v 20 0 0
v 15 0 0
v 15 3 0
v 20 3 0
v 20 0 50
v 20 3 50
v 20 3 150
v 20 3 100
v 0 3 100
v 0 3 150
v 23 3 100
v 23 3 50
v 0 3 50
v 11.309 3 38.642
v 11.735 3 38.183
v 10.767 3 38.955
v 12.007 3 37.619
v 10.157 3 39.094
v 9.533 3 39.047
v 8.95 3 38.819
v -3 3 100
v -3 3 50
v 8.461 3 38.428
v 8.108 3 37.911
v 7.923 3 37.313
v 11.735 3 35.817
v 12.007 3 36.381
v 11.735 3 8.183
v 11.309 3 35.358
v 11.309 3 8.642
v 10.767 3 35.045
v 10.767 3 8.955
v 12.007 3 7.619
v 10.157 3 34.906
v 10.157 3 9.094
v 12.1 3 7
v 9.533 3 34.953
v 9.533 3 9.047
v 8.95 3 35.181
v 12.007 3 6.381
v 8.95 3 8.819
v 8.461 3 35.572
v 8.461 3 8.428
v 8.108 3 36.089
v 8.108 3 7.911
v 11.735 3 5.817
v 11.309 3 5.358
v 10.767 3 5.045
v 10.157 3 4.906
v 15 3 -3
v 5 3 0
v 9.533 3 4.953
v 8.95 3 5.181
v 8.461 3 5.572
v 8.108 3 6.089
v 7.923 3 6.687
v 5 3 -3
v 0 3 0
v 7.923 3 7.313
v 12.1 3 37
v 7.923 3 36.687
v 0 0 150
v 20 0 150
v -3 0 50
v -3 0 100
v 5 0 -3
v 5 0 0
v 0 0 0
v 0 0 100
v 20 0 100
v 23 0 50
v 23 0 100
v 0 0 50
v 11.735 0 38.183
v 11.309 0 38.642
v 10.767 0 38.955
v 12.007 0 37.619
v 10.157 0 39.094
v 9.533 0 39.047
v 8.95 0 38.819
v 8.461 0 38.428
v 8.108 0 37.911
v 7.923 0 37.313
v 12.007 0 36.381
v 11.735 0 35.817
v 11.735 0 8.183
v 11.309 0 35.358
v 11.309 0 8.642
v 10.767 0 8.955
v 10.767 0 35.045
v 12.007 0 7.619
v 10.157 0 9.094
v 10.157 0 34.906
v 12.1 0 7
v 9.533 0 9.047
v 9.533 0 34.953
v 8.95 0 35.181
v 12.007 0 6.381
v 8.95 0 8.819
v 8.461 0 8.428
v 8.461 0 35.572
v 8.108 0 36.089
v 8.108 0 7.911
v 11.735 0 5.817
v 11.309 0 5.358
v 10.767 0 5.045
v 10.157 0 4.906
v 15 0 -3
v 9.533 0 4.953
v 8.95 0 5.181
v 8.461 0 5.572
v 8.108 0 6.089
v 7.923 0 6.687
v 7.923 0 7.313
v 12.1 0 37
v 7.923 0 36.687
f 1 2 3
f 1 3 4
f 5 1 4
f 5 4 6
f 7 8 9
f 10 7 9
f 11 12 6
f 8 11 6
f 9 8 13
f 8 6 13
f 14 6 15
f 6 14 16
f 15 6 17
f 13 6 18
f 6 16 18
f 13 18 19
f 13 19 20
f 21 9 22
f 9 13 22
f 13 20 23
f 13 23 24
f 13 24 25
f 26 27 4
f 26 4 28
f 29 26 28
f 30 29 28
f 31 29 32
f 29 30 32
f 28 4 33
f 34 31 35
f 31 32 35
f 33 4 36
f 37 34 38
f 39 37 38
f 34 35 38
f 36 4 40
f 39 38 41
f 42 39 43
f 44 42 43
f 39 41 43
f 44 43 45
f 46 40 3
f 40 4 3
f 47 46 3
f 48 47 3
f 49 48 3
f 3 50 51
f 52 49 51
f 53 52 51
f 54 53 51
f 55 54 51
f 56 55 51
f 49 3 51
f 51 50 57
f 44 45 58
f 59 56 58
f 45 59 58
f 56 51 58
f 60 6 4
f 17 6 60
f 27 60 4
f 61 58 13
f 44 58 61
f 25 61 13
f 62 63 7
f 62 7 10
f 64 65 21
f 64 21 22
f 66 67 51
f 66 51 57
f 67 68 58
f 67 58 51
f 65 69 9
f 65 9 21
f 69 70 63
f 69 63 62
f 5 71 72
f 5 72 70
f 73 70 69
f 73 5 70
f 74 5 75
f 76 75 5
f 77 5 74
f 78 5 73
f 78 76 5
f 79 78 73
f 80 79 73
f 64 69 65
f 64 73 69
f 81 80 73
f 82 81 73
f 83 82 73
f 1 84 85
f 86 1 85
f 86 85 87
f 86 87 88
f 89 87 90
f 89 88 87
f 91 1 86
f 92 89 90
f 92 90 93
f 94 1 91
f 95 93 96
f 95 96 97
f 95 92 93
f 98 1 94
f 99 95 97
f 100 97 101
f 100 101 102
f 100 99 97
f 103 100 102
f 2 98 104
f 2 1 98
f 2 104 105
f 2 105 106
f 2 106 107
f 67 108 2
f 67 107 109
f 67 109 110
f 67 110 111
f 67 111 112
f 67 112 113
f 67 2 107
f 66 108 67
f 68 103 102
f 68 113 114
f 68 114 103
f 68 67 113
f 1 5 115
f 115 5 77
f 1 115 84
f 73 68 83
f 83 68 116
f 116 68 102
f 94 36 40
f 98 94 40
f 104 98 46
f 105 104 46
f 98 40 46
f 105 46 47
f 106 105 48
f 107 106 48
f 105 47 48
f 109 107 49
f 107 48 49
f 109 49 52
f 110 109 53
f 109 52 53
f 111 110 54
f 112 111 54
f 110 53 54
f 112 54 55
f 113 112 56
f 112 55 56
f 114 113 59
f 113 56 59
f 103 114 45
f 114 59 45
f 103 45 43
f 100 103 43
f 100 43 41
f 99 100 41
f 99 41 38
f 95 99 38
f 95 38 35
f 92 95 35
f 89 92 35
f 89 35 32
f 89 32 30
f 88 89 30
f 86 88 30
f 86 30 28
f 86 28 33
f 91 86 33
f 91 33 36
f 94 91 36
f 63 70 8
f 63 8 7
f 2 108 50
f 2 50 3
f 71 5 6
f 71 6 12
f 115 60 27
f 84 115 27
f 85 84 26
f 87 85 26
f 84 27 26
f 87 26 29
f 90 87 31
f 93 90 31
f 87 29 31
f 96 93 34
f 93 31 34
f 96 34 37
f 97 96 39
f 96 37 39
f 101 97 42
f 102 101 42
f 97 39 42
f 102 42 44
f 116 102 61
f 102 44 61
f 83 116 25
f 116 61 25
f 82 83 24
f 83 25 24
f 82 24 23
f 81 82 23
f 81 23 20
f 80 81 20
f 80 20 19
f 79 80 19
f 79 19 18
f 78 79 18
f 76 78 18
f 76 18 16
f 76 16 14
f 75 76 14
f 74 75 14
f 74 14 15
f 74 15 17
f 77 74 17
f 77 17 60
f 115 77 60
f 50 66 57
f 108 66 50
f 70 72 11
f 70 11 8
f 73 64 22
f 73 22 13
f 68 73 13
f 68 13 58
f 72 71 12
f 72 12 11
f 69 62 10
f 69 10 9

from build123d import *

# Parameters (mm, degrees)
BOSS_EXTRUDE1_DEPTH = 3
SKETCH2_R           = 2.1
CUT_EXTRUDE1_DEPTH  = 4


with BuildPart() as part:
    # Sketch1 → Boss-Extrude1 (new body)
    with BuildSketch(Plane(origin=(0, 0, 0), x_dir=(1, 0, 0), z_dir=(0, 1, 0))):
        Polygon((15, 0), (20, 0), (20, -50), (23, -50), (23, -100), (20, -100), (20, -150), (0, -150), (0, -100), (-3, -100), (-3, -50), (0, -50), (0, 0), (5, 0), (5, 3), (15, 3), align=None)
    extrude(amount=BOSS_EXTRUDE1_DEPTH)

    # Sketch2 → Cut-Extrude1 (cut, through all)
    with BuildSketch(Plane(origin=(0, 3, 0), x_dir=(1, 0, 0), z_dir=(0, 1, 0))):
        with Locations((10, -7)):
            Circle(SKETCH2_R)
        with Locations((10, -37)):
            Circle(SKETCH2_R)
    extrude(amount=-CUT_EXTRUDE1_DEPTH, mode=Mode.SUBTRACT)


solid = part.part
